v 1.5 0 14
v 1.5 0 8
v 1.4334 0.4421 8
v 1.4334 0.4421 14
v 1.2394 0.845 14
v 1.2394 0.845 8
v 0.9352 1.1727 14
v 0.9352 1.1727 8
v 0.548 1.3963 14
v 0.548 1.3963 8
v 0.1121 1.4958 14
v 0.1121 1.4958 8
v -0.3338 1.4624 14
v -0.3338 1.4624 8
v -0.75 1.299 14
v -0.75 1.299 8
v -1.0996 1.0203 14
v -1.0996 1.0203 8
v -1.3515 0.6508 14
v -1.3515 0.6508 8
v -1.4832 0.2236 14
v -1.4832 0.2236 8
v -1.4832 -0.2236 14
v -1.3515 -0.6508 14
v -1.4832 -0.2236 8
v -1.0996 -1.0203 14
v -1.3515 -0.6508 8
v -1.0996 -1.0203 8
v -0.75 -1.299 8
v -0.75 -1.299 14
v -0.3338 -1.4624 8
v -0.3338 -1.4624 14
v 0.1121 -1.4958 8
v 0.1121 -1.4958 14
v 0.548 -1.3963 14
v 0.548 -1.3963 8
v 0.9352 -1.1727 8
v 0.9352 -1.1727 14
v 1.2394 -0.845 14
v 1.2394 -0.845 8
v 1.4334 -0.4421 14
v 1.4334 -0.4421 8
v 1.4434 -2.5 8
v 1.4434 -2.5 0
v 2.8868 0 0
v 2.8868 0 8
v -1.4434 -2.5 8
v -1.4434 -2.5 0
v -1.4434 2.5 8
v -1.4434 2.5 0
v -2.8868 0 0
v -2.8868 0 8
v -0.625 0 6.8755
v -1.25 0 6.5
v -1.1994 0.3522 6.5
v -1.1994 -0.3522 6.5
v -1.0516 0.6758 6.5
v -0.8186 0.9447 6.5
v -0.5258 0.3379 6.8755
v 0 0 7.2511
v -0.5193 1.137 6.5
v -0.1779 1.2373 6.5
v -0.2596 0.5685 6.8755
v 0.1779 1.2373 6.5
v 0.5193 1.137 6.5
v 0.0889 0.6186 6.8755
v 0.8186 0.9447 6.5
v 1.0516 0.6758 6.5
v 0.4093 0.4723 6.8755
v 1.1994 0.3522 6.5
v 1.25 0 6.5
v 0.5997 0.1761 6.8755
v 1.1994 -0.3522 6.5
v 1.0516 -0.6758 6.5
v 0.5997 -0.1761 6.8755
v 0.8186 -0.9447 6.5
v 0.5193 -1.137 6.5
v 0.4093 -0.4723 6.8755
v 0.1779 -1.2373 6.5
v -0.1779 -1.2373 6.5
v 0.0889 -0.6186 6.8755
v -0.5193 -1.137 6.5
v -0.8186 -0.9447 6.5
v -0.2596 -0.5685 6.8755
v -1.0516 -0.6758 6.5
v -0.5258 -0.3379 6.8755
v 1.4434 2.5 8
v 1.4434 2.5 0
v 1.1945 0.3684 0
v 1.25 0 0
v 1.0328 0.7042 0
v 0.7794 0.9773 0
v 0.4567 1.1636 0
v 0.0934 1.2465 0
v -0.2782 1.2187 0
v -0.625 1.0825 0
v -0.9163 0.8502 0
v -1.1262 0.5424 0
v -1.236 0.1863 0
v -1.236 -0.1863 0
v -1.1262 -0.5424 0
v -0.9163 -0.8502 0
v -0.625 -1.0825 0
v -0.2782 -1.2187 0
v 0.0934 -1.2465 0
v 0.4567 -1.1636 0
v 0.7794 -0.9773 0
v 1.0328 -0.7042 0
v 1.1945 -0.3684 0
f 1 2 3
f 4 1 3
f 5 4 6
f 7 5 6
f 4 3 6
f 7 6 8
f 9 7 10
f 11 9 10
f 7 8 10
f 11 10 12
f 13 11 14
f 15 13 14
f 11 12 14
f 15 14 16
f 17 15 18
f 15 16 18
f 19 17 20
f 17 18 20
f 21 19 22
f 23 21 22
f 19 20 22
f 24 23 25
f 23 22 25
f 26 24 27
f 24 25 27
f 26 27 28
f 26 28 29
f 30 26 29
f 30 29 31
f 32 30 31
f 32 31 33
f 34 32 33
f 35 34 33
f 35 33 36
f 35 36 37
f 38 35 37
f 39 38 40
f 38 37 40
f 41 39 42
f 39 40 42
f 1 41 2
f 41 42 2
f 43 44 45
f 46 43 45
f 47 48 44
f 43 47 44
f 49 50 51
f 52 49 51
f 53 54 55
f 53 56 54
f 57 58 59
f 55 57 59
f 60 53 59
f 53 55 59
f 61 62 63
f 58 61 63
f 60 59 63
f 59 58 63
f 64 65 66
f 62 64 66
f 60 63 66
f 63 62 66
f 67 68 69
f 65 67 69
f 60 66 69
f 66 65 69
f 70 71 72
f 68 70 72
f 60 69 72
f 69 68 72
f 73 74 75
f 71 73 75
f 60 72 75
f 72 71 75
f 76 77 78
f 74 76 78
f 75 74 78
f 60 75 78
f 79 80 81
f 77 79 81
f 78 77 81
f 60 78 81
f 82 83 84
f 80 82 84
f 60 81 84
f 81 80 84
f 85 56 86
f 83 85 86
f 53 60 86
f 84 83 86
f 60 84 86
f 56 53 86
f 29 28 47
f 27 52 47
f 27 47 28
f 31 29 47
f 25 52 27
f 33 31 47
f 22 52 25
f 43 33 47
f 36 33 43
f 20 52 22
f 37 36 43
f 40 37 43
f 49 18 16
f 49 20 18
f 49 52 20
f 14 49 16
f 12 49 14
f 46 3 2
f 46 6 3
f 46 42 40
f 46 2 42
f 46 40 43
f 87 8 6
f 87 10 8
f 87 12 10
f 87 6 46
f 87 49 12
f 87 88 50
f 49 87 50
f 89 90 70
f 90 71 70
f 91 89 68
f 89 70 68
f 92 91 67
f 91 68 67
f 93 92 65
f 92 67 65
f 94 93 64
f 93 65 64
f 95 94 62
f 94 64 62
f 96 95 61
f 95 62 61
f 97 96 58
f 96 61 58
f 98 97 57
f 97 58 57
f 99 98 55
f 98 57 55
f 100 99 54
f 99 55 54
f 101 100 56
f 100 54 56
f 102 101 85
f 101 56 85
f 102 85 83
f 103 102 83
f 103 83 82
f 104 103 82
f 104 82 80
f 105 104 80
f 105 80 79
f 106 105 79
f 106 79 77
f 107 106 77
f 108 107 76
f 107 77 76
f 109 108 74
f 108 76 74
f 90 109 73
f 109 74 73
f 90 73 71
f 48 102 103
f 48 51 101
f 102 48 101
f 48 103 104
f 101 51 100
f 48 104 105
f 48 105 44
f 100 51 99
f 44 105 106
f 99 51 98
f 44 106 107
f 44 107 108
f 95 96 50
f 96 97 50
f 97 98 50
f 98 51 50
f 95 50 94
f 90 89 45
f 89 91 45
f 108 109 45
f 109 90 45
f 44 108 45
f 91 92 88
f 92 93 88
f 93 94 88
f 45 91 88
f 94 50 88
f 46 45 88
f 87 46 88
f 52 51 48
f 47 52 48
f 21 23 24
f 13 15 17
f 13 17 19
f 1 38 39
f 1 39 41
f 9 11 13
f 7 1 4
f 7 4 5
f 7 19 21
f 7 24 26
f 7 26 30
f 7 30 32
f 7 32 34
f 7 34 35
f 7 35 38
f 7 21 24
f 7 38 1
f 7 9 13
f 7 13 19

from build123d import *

# Parameters (mm, degrees)
EXTRUDE_1_DEPTH = 8
SKETCH_2_R      = 1.5
EXTRUDE_2_DEPTH = 6
M3X0_5_1_D      = 2.5
M3X0_5_1_DEPTH  = 6.5
M3X0_5_1_TIP    = 0.751075774


with BuildPart() as part:
    # 草图1 → 拉伸1 (new body)
    with BuildSketch(Plane.XY):
        Polygon((1.443375673, -2.5), (2.886751346, 0), (1.443375673, 2.5), (-1.443375673, 2.5), (-2.886751346, 0), (-1.443375673, -2.5), align=None)
    extrude(amount=EXTRUDE_1_DEPTH)

    # 草图2 → 拉伸2 (add)
    with BuildSketch(Plane.XY.offset(8)):
        Circle(SKETCH_2_R)
    extrude(amount=EXTRUDE_2_DEPTH)

    # M3x0.5 螺纹孔1
    with Locations(Plane(origin=(0, 0, 0), x_dir=(-1, 0, 0), z_dir=(0, 0, -1))):
        with Locations((0, 0)):
            Hole(M3X0_5_1_D / 2, depth=M3X0_5_1_DEPTH)
            with Locations((0, 0, -(M3X0_5_1_DEPTH + M3X0_5_1_TIP / 2))):  # 118° drill point
                Cone(0, M3X0_5_1_D / 2, M3X0_5_1_TIP, mode=Mode.SUBTRACT)


solid = part.part
